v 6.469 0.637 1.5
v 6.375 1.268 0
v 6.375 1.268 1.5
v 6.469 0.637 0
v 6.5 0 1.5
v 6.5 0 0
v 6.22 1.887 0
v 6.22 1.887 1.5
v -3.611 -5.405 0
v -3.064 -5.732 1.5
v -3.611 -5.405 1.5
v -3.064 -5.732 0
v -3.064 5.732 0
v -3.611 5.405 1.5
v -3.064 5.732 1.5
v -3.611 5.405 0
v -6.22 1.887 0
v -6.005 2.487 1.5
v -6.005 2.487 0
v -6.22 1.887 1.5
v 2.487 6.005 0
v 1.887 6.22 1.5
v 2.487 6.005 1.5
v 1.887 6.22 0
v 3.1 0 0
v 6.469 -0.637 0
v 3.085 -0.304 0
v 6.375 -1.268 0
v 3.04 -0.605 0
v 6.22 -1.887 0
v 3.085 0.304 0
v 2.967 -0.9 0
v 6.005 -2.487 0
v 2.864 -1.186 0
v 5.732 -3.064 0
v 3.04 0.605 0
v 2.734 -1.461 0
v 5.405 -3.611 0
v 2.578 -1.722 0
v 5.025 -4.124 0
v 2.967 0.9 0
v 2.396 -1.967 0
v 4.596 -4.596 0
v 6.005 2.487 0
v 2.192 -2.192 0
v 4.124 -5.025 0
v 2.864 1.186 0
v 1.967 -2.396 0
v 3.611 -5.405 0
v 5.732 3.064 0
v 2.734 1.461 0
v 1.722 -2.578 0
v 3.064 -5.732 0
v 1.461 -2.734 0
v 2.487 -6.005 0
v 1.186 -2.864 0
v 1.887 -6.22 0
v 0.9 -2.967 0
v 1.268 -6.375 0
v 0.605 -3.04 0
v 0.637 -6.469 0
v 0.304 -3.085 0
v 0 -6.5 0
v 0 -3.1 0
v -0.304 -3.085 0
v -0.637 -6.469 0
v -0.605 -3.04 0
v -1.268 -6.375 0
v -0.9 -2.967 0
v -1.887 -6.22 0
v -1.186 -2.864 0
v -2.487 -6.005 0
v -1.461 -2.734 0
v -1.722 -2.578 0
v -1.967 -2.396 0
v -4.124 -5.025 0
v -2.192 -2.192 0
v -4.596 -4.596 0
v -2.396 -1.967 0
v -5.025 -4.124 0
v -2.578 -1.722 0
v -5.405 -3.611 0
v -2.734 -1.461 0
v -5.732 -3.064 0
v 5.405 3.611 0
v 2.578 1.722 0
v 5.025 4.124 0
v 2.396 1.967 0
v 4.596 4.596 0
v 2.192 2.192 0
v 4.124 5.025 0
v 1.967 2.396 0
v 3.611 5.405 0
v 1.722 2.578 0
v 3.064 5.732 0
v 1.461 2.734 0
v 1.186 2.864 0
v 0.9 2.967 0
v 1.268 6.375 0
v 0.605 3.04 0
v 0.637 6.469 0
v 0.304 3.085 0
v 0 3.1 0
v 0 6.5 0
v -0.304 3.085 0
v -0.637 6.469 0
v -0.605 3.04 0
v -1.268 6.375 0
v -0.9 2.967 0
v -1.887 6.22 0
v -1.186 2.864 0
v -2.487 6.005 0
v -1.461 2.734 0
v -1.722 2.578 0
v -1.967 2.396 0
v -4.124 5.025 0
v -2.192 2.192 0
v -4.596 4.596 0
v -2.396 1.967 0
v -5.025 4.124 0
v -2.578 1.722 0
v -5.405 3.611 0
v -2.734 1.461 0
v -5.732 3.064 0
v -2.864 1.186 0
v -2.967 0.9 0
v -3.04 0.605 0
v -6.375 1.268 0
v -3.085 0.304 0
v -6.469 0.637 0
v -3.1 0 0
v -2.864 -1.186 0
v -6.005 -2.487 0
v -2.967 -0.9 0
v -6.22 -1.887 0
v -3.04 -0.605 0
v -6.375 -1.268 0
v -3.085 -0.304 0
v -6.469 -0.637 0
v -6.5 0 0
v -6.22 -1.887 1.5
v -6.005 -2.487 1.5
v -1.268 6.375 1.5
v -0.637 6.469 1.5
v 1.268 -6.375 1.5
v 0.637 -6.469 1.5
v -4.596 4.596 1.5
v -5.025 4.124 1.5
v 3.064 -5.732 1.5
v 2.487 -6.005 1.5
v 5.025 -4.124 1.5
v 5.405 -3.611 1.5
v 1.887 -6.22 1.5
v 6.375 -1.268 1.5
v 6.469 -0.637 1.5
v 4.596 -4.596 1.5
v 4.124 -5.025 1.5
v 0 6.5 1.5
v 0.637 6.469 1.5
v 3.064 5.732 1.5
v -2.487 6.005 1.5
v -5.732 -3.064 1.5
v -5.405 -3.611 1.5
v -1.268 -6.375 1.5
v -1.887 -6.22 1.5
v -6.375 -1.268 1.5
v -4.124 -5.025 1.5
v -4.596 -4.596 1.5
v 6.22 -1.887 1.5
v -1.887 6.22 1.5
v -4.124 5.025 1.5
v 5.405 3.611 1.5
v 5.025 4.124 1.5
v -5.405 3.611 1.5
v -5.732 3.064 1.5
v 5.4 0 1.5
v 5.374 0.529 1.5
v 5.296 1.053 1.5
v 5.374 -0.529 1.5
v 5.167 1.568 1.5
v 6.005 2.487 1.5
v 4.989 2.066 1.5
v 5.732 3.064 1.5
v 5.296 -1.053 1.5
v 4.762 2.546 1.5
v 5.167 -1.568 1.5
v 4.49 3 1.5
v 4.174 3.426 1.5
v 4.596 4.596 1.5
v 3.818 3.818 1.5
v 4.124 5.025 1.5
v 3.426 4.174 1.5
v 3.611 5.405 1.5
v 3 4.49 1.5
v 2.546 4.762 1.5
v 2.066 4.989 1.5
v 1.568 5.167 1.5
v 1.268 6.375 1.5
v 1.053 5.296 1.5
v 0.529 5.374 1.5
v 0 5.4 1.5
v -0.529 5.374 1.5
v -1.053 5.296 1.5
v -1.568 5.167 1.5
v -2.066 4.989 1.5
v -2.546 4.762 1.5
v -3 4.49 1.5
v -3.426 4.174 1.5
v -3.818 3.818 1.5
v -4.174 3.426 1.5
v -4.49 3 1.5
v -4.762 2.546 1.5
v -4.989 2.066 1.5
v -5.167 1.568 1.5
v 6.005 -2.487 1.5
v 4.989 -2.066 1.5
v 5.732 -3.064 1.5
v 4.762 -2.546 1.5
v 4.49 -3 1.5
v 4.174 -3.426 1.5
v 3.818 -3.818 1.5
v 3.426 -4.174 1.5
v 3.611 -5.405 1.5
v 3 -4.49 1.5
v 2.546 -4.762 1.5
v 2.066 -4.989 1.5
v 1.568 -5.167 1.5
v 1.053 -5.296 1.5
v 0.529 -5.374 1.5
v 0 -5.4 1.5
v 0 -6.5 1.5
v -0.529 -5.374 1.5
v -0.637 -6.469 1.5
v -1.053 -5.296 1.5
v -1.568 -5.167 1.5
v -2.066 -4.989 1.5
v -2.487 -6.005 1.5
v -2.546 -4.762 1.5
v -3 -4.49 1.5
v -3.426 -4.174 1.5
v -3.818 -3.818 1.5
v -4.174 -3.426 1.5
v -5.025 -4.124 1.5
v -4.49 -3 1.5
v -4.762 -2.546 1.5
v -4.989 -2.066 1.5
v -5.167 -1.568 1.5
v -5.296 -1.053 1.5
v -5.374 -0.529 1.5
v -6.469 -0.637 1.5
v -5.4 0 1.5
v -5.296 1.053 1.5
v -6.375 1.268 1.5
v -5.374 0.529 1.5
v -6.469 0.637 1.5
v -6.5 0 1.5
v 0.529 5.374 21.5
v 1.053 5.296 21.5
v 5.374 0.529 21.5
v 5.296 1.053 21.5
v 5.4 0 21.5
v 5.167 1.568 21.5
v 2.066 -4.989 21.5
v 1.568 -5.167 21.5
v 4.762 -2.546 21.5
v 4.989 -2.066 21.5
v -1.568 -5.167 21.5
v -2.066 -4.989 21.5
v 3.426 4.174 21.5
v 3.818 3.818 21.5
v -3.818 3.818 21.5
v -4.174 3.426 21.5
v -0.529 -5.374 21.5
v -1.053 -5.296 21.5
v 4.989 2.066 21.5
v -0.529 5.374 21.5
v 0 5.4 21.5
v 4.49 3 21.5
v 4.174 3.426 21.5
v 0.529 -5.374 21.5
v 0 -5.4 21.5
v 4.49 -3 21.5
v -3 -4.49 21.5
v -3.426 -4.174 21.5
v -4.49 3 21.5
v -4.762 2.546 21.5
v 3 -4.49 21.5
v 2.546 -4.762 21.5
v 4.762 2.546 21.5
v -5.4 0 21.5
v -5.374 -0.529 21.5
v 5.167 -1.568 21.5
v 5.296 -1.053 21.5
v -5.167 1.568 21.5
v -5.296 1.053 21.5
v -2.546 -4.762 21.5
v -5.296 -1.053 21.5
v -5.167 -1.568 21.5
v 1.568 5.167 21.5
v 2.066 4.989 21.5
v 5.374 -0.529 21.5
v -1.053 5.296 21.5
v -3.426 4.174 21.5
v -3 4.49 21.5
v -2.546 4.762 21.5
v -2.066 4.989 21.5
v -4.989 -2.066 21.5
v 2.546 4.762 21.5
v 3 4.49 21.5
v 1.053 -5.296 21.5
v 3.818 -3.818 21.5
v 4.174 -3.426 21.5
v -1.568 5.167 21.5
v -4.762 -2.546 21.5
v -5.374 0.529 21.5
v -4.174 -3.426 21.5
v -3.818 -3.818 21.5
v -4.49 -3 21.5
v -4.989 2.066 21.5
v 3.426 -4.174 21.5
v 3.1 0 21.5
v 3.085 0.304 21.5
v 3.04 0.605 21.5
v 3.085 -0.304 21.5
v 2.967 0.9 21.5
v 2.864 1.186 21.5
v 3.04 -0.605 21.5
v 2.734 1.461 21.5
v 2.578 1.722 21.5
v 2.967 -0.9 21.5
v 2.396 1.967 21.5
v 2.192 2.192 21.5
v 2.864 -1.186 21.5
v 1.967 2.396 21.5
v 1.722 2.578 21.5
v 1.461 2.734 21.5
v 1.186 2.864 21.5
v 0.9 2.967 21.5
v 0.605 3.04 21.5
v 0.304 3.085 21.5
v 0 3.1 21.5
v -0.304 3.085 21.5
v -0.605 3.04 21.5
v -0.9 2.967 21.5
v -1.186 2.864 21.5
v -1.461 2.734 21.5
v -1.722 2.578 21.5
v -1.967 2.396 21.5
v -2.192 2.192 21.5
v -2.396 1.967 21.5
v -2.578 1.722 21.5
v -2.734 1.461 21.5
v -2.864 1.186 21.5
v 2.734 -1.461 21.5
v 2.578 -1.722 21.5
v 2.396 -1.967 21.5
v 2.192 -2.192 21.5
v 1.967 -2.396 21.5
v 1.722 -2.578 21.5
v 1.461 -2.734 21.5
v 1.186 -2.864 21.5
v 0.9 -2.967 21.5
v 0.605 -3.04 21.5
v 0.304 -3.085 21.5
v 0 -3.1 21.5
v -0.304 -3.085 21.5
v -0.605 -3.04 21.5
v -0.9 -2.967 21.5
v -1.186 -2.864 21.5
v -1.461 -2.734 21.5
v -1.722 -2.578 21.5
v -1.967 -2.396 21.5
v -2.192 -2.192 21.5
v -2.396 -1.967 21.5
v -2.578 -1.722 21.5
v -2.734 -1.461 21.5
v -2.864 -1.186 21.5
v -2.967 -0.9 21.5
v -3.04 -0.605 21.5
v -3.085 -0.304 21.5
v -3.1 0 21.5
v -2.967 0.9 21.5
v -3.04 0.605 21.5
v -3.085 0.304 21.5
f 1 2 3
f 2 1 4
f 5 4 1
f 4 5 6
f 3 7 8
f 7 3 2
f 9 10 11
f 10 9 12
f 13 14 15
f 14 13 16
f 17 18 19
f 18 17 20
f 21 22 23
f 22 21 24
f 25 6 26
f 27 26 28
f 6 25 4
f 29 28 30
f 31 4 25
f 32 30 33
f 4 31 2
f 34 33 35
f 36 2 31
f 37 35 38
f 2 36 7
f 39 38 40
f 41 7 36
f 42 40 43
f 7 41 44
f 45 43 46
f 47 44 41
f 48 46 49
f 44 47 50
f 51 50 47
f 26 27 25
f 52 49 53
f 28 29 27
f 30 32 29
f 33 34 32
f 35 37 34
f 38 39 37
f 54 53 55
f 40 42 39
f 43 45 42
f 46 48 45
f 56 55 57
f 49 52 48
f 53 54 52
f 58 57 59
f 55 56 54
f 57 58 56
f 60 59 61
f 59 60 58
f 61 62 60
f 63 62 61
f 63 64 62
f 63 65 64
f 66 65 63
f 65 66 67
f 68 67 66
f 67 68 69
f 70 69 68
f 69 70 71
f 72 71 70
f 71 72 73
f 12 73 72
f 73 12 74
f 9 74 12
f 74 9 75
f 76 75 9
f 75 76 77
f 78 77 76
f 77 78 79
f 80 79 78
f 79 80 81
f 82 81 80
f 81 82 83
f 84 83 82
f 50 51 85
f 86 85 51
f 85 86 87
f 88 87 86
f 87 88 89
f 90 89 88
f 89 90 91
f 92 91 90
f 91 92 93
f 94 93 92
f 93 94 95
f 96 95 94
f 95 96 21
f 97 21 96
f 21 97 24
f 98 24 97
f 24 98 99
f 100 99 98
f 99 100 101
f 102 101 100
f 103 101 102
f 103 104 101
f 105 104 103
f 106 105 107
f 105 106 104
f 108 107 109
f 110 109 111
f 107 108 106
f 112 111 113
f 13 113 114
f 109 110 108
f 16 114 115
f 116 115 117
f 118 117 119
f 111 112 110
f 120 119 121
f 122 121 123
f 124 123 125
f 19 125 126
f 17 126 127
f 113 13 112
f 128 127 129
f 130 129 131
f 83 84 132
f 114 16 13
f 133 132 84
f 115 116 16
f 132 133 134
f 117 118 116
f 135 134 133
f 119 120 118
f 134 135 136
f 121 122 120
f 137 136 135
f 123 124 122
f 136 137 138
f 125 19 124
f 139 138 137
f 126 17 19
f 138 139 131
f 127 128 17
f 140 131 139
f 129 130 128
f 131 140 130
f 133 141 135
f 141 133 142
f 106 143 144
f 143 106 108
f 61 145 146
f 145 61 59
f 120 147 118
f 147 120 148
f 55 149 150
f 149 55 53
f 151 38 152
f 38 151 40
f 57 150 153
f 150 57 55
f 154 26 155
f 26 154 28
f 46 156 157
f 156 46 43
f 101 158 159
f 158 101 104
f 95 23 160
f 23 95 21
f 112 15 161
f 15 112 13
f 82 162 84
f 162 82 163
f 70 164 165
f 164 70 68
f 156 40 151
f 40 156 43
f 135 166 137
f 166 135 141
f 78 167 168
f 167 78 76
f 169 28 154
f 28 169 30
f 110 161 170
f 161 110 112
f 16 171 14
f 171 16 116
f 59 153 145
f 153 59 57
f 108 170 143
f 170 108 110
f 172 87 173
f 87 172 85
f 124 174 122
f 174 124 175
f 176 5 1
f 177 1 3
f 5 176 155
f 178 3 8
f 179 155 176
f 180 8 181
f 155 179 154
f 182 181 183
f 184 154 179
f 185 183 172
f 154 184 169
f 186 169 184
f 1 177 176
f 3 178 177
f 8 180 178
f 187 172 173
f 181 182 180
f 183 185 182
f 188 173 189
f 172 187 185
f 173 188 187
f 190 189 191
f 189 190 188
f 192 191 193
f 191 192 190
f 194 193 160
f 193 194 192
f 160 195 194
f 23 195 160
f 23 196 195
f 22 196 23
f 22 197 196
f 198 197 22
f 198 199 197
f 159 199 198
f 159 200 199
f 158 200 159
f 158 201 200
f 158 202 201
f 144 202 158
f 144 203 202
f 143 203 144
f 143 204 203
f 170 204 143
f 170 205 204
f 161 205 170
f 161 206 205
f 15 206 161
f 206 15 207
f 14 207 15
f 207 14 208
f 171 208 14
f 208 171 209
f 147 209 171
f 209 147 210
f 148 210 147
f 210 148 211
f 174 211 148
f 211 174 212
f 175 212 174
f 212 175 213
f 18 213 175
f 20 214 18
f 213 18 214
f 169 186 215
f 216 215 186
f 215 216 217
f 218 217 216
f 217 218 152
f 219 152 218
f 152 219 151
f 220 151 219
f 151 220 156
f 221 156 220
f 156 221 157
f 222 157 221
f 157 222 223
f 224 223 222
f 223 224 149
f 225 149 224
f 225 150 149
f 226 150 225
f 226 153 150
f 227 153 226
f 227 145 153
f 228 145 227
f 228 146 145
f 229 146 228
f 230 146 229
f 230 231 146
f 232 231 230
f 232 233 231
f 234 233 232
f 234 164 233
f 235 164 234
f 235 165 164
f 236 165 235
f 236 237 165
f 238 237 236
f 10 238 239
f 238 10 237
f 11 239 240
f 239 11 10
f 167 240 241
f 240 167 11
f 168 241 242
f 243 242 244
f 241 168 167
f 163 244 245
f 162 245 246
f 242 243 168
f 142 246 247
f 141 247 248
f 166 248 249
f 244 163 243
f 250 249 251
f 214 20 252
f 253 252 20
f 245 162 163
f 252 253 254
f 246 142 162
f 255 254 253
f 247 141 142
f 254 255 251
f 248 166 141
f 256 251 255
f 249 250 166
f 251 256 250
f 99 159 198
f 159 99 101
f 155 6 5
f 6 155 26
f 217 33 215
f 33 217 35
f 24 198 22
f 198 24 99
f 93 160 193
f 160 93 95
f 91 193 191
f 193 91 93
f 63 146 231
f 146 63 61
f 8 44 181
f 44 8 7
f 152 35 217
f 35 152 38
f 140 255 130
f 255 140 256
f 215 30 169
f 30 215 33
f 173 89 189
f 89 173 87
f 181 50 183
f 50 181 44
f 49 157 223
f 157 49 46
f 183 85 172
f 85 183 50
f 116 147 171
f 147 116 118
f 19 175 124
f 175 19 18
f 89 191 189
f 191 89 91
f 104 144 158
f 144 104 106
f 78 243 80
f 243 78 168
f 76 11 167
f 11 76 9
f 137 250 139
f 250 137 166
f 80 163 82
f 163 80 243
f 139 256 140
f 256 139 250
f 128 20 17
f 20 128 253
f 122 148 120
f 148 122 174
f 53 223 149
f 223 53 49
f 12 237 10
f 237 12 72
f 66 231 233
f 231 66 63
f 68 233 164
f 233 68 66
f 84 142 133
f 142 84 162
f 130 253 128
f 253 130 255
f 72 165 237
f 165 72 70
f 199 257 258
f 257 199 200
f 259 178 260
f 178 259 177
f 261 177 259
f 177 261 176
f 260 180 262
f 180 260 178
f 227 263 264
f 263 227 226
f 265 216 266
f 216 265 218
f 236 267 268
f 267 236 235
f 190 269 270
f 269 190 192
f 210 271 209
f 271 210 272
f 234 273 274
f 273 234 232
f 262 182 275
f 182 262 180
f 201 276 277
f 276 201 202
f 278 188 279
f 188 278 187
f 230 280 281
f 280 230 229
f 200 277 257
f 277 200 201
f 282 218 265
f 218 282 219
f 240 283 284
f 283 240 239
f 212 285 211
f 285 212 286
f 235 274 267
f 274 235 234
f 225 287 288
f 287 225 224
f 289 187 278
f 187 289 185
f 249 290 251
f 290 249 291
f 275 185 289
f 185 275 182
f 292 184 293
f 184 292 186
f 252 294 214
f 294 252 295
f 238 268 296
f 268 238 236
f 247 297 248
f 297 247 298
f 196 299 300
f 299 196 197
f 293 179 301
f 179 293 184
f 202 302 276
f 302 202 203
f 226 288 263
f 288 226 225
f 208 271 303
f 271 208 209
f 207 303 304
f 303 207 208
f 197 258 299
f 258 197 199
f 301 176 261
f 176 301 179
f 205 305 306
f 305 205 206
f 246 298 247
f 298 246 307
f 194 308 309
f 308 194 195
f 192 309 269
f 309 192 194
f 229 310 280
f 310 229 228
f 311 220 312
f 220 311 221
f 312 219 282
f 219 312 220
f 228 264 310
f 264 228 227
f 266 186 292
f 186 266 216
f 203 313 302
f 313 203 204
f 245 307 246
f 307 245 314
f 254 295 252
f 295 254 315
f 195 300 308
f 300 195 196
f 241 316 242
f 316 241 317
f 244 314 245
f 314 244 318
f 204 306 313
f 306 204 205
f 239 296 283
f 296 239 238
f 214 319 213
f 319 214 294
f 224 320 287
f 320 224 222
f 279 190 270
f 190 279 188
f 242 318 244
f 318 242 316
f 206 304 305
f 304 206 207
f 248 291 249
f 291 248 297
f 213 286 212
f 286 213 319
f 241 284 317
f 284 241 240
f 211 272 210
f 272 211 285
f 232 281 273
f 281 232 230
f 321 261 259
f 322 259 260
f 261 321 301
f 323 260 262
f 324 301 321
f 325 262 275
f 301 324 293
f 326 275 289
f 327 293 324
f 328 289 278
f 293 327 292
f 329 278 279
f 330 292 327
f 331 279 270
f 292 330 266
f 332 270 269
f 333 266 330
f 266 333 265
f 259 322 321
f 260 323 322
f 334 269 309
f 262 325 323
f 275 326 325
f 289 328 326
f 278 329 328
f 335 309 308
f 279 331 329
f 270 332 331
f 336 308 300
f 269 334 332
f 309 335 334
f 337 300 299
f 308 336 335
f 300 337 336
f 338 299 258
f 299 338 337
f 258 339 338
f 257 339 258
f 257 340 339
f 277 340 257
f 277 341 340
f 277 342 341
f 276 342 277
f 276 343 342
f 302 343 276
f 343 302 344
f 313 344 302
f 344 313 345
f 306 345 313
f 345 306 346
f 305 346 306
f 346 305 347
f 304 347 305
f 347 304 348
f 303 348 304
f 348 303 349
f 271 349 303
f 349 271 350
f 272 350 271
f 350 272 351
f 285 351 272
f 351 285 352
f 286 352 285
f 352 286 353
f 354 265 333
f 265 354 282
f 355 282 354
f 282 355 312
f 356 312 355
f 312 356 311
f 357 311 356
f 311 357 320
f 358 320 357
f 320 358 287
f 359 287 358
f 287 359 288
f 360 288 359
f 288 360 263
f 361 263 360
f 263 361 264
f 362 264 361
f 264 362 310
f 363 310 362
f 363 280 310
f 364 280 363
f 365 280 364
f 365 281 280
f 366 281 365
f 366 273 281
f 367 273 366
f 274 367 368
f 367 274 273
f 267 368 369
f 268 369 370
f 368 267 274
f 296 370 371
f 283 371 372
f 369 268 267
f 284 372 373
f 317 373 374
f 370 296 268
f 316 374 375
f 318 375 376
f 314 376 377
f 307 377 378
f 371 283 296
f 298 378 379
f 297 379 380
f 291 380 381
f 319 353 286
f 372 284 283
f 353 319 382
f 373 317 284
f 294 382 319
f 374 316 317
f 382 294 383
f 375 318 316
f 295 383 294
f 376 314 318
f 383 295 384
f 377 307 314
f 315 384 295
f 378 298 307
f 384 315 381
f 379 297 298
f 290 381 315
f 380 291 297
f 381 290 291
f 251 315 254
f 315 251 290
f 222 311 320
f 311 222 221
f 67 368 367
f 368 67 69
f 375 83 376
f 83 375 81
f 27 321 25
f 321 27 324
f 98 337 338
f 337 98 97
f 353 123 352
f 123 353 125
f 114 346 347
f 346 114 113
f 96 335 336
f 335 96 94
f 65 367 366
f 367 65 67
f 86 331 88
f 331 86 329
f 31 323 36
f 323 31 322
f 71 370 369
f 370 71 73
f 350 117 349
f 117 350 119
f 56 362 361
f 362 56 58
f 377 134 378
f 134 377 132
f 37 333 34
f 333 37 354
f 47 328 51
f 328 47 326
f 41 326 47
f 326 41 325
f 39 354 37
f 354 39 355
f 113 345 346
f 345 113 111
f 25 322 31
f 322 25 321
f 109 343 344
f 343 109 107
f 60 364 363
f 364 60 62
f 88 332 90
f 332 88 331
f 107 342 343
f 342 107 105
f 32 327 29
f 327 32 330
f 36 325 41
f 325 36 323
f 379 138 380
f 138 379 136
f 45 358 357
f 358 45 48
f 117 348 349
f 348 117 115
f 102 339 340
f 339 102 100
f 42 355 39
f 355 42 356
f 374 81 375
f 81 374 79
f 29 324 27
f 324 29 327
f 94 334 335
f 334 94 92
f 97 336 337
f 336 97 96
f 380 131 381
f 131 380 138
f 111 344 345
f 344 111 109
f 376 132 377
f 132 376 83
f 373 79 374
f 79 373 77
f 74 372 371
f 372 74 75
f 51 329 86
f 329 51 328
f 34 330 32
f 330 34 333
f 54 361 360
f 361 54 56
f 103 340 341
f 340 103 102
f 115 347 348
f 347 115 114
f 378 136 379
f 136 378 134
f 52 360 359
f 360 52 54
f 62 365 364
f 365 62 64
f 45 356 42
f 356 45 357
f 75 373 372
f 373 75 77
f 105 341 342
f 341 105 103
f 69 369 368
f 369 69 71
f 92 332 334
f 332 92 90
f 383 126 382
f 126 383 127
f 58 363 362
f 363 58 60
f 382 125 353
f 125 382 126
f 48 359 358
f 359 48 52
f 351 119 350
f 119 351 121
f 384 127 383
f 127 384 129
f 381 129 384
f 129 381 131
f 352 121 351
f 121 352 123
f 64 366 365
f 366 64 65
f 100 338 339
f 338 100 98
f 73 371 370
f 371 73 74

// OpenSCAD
// Dimensions
collar_diameter = 13.0;        // Diameter of the base collar
collar_thickness = 1.5;        // Thickness of the base collar
sleeve_outer_diameter = 10.8;  // Outer diameter of the main sleeve
total_height = 21.5;           // Total height from the bed to the top
bore_diameter = 6.2;           // Diameter of the central hole
$fn = 64;                      // Resolution for curved surfaces

// Part Construction
difference() {
    // The solid part of the adapter
    union() {
        // Base collar (z = 0 to 1.5)
        cylinder(d=collar_diameter, h=collar_thickness);
        
        // Sleeve body (rises from collar to z = 21.5)
        // The height of this cylinder is total_height minus the collar thickness
        translate([0, 0, collar_thickness])
            cylinder(d=sleeve_outer_diameter, h=total_height - collar_thickness);
    }

    // The central bore (runs through the full height)
    // We extend the cutting cylinder slightly beyond the object boundaries 
    // to ensure a clean through-hole.
    translate([0, 0, -1])
        cylinder(d=bore_diameter, h=total_height + 2);
}
